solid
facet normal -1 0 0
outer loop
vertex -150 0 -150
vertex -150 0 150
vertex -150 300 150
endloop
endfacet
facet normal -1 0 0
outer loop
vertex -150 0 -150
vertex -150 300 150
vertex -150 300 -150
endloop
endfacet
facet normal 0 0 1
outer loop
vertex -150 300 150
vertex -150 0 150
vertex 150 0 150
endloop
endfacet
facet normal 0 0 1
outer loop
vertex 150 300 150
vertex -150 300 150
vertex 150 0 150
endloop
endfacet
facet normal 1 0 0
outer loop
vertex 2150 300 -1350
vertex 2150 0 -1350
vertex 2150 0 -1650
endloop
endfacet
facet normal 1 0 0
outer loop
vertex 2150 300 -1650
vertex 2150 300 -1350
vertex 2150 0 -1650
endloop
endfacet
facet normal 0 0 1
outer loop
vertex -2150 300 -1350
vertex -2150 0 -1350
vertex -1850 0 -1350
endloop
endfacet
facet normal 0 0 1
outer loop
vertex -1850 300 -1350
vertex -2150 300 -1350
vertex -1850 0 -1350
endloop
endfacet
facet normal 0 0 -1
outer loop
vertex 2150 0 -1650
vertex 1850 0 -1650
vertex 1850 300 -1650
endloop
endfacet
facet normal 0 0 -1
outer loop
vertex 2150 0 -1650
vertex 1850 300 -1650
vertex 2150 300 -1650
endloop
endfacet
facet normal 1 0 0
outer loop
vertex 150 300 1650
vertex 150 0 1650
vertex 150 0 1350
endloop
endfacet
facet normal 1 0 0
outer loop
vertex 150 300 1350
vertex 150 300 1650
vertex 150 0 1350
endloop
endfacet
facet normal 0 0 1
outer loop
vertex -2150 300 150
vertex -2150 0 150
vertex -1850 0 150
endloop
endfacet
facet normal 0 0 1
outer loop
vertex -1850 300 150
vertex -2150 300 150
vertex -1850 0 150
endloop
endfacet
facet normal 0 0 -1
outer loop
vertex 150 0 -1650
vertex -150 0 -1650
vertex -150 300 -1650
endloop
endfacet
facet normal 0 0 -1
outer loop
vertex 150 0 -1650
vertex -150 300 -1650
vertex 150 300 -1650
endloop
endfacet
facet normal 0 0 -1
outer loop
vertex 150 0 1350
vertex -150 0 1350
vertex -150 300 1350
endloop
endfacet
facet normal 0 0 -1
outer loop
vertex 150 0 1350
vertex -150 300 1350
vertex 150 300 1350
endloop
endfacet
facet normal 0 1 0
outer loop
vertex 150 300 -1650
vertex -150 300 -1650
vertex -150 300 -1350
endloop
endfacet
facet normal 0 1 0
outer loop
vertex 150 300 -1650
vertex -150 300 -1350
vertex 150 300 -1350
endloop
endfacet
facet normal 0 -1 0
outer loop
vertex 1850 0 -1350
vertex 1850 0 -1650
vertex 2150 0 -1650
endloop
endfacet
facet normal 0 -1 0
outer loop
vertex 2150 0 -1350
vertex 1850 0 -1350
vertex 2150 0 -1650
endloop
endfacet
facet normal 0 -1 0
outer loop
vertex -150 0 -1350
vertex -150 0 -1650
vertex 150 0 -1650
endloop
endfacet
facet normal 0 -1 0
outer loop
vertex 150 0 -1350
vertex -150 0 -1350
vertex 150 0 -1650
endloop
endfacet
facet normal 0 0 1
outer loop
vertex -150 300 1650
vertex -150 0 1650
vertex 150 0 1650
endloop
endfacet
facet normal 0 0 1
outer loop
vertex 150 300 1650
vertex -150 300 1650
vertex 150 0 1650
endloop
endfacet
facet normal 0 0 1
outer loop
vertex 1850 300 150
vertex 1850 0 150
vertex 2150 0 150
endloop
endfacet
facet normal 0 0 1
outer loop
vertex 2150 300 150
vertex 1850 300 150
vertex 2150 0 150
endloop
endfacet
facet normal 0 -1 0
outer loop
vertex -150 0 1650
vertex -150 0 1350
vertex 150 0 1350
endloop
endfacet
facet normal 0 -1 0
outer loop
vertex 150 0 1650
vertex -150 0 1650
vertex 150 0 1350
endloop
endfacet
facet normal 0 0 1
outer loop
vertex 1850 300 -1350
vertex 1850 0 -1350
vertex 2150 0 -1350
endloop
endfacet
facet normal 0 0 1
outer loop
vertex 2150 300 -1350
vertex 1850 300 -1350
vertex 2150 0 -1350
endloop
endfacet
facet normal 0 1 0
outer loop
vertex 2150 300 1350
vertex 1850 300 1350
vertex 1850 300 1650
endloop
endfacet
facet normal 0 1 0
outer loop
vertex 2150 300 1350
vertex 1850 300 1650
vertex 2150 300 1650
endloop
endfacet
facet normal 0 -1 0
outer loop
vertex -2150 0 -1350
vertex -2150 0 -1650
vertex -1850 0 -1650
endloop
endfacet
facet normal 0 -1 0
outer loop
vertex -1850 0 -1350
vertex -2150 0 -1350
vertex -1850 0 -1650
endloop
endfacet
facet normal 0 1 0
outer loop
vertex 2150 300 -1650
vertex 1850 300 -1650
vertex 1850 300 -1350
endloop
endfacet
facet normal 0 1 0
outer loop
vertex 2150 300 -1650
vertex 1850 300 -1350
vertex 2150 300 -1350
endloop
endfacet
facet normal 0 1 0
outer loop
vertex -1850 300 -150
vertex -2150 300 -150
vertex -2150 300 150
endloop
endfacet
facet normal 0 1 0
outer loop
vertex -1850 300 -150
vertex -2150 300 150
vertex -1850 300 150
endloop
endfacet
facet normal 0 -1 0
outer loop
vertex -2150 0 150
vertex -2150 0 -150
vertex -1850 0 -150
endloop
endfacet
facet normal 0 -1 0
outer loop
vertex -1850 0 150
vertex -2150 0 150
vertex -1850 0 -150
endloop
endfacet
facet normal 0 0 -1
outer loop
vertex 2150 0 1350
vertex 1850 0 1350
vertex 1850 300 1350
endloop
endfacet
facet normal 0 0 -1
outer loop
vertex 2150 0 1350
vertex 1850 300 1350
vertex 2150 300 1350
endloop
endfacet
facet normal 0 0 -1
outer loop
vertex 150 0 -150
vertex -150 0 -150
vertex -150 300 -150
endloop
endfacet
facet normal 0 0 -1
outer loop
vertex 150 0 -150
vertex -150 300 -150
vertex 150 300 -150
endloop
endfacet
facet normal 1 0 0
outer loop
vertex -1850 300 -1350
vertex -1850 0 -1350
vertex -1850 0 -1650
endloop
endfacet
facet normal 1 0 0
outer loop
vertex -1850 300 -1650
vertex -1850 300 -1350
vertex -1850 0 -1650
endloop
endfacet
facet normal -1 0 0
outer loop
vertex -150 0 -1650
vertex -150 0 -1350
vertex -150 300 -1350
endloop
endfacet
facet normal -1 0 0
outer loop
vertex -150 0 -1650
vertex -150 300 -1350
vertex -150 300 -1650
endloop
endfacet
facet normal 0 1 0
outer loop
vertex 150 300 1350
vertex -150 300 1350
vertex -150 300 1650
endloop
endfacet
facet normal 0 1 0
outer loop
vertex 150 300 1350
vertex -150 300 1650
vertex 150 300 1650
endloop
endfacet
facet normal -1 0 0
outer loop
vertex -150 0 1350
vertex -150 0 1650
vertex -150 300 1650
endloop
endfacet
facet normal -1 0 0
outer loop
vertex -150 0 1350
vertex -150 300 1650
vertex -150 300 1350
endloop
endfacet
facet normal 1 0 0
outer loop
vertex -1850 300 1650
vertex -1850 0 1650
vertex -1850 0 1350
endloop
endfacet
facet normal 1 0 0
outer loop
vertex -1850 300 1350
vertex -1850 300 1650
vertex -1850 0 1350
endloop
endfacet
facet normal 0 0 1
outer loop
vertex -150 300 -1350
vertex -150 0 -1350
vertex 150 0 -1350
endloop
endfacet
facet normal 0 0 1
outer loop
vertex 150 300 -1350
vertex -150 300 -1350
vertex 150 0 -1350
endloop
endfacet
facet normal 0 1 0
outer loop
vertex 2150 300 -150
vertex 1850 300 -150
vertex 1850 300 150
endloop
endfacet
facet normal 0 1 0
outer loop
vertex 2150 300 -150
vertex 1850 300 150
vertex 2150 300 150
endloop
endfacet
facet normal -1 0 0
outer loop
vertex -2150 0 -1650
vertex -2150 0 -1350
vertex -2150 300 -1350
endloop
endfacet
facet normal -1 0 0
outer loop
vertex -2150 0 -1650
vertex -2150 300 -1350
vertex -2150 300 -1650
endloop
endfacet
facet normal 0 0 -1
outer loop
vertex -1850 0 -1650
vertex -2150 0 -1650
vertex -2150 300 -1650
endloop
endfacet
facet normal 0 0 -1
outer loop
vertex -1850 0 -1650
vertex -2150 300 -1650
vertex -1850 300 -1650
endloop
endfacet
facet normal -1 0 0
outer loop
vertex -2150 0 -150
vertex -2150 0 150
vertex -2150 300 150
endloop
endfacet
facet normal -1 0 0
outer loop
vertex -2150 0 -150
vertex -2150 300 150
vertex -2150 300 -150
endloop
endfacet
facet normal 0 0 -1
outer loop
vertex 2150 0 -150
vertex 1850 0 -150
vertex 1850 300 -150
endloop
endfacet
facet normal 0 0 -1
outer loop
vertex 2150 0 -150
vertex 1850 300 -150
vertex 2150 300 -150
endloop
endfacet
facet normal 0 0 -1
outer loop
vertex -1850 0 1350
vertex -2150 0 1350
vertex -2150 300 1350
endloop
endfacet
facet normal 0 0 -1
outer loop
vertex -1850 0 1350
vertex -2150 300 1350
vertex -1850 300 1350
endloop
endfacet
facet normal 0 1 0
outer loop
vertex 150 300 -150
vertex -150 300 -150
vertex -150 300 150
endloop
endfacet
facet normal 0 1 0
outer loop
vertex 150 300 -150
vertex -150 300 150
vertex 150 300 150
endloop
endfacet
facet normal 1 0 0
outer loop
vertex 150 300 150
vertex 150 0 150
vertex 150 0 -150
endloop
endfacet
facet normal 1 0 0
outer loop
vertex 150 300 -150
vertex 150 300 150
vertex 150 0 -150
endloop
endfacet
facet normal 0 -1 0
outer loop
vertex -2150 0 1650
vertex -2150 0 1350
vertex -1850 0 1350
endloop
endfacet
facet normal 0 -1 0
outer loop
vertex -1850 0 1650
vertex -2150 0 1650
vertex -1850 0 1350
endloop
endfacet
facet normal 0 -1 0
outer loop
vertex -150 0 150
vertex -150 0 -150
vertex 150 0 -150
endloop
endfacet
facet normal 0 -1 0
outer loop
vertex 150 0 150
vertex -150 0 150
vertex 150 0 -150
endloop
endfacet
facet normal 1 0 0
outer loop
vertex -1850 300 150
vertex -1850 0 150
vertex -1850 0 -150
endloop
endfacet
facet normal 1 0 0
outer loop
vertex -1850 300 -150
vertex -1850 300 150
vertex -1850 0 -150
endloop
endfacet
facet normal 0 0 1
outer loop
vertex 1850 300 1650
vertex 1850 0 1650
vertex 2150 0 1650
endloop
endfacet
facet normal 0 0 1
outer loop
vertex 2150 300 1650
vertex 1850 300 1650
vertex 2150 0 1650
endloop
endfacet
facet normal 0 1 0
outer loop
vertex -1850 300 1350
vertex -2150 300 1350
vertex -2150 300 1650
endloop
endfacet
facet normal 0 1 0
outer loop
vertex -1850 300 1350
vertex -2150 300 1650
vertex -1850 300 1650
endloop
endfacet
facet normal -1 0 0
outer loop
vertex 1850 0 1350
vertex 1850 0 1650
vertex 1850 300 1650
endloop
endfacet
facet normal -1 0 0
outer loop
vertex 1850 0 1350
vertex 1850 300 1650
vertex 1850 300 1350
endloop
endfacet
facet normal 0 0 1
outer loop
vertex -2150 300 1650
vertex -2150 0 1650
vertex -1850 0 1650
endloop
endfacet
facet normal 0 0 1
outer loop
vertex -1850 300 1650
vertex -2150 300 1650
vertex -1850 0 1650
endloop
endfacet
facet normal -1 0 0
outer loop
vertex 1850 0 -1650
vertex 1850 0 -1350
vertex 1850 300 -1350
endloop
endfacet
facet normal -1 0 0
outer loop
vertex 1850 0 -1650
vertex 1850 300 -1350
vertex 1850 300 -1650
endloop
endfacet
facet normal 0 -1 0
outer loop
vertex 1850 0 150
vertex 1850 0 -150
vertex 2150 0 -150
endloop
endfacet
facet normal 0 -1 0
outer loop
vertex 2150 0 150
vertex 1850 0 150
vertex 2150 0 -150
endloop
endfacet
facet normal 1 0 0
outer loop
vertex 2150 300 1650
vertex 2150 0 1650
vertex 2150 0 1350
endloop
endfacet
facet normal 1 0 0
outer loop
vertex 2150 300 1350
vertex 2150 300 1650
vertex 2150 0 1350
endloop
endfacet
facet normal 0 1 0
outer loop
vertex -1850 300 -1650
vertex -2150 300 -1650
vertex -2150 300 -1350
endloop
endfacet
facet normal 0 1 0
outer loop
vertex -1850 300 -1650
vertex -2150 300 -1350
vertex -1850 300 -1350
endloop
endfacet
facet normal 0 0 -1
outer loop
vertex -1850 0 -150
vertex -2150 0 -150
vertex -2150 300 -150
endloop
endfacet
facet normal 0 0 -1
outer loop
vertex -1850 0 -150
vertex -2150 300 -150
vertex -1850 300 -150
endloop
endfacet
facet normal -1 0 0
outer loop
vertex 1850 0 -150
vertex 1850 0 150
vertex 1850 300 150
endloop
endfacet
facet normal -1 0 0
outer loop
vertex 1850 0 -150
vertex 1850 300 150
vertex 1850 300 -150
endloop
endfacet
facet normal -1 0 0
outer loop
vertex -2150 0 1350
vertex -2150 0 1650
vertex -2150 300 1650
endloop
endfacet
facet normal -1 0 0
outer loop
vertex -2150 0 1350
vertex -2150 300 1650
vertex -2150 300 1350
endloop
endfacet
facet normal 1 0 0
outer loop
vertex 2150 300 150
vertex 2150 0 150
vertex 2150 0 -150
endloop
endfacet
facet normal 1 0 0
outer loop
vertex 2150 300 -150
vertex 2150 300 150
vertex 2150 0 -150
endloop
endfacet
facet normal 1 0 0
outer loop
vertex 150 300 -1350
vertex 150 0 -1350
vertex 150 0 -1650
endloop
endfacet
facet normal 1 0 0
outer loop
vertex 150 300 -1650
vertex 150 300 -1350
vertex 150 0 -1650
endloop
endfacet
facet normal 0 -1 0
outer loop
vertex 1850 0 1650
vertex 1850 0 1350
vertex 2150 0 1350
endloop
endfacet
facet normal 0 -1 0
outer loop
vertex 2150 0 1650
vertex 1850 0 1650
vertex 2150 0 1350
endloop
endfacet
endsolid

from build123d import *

# Parameters (mm, degrees)
SKETCH_1_W        = 300
SKETCH_1_H        = 300
EXTRUDE_1_DEPTH   = 300
EXTRUDE_1_2_DEPTH = 300
EXTRUDE_1_3_DEPTH = 300
EXTRUDE_1_4_DEPTH = 300
EXTRUDE_1_5_DEPTH = 300
EXTRUDE_1_6_DEPTH = 300
EXTRUDE_1_7_DEPTH = 300
EXTRUDE_1_8_DEPTH = 300
EXTRUDE_1_9_DEPTH = 300


with BuildPart() as part:
    # Эскиз1 → Бобышка-Вытянуть1 (new body)
    with BuildSketch(Plane(origin=(0, 0, 0), x_dir=(1, 0, 0), z_dir=(0, 1, 0))):
        with Locations((0, -1500)):
            Rectangle(SKETCH_1_W, SKETCH_1_H)
    extrude(amount=EXTRUDE_1_DEPTH)


with BuildPart() as body_2:
    # Эскиз1 → Extrude 1 2 (new body)
    with BuildSketch(Plane(origin=(0, 0, 0), x_dir=(1, 0, 0), z_dir=(0, 1, 0))):
        with Locations((-2000, -1500)):
            Rectangle(SKETCH_1_W, SKETCH_1_H)
    extrude(amount=EXTRUDE_1_2_DEPTH)


with BuildPart() as body_3:
    # Эскиз1 → Extrude 1 3 (new body)
    with BuildSketch(Plane(origin=(0, 0, 0), x_dir=(1, 0, 0), z_dir=(0, 1, 0))):
        with Locations((2000, -1500)):
            Rectangle(SKETCH_1_W, SKETCH_1_H)
    extrude(amount=EXTRUDE_1_3_DEPTH)


with BuildPart() as body_4:
    # Эскиз1 → Extrude 1 4 (new body)
    with BuildSketch(Plane(origin=(0, 0, 0), x_dir=(1, 0, 0), z_dir=(0, 1, 0))):
        Rectangle(SKETCH_1_W, SKETCH_1_H)
    extrude(amount=EXTRUDE_1_4_DEPTH)


with BuildPart() as body_5:
    # Эскиз1 → Extrude 1 5 (new body)
    with BuildSketch(Plane(origin=(0, 0, 0), x_dir=(1, 0, 0), z_dir=(0, 1, 0))):
        with Locations((2000, 0)):
            Rectangle(SKETCH_1_W, SKETCH_1_H)
    extrude(amount=EXTRUDE_1_5_DEPTH)


with BuildPart() as body_6:
    # Эскиз1 → Extrude 1 6 (new body)
    with BuildSketch(Plane(origin=(0, 0, 0), x_dir=(1, 0, 0), z_dir=(0, 1, 0))):
        with Locations((0, 1500)):
            Rectangle(SKETCH_1_W, SKETCH_1_H)
    extrude(amount=EXTRUDE_1_6_DEPTH)


with BuildPart() as body_7:
    # Эскиз1 → Extrude 1 7 (new body)
    with BuildSketch(Plane(origin=(0, 0, 0), x_dir=(1, 0, 0), z_dir=(0, 1, 0))):
        with Locations((2000, 1500)):
            Rectangle(SKETCH_1_W, SKETCH_1_H)
    extrude(amount=EXTRUDE_1_7_DEPTH)


with BuildPart() as body_8:
    # Эскиз1 → Extrude 1 8 (new body)
    with BuildSketch(Plane(origin=(0, 0, 0), x_dir=(1, 0, 0), z_dir=(0, 1, 0))):
        with Locations((-2000, 0)):
            Rectangle(SKETCH_1_W, SKETCH_1_H)
    extrude(amount=EXTRUDE_1_8_DEPTH)


with BuildPart() as body_9:
    # Эскиз1 → Extrude 1 9 (new body)
    with BuildSketch(Plane(origin=(0, 0, 0), x_dir=(1, 0, 0), z_dir=(0, 1, 0))):
        with Locations((-2000, 1500)):
            Rectangle(SKETCH_1_W, SKETCH_1_H)
    extrude(amount=EXTRUDE_1_9_DEPTH)


solid = Compound([part.part, body_2.part, body_3.part, body_4.part, body_5.part, body_6.part, body_7.part, body_8.part, body_9.part])
